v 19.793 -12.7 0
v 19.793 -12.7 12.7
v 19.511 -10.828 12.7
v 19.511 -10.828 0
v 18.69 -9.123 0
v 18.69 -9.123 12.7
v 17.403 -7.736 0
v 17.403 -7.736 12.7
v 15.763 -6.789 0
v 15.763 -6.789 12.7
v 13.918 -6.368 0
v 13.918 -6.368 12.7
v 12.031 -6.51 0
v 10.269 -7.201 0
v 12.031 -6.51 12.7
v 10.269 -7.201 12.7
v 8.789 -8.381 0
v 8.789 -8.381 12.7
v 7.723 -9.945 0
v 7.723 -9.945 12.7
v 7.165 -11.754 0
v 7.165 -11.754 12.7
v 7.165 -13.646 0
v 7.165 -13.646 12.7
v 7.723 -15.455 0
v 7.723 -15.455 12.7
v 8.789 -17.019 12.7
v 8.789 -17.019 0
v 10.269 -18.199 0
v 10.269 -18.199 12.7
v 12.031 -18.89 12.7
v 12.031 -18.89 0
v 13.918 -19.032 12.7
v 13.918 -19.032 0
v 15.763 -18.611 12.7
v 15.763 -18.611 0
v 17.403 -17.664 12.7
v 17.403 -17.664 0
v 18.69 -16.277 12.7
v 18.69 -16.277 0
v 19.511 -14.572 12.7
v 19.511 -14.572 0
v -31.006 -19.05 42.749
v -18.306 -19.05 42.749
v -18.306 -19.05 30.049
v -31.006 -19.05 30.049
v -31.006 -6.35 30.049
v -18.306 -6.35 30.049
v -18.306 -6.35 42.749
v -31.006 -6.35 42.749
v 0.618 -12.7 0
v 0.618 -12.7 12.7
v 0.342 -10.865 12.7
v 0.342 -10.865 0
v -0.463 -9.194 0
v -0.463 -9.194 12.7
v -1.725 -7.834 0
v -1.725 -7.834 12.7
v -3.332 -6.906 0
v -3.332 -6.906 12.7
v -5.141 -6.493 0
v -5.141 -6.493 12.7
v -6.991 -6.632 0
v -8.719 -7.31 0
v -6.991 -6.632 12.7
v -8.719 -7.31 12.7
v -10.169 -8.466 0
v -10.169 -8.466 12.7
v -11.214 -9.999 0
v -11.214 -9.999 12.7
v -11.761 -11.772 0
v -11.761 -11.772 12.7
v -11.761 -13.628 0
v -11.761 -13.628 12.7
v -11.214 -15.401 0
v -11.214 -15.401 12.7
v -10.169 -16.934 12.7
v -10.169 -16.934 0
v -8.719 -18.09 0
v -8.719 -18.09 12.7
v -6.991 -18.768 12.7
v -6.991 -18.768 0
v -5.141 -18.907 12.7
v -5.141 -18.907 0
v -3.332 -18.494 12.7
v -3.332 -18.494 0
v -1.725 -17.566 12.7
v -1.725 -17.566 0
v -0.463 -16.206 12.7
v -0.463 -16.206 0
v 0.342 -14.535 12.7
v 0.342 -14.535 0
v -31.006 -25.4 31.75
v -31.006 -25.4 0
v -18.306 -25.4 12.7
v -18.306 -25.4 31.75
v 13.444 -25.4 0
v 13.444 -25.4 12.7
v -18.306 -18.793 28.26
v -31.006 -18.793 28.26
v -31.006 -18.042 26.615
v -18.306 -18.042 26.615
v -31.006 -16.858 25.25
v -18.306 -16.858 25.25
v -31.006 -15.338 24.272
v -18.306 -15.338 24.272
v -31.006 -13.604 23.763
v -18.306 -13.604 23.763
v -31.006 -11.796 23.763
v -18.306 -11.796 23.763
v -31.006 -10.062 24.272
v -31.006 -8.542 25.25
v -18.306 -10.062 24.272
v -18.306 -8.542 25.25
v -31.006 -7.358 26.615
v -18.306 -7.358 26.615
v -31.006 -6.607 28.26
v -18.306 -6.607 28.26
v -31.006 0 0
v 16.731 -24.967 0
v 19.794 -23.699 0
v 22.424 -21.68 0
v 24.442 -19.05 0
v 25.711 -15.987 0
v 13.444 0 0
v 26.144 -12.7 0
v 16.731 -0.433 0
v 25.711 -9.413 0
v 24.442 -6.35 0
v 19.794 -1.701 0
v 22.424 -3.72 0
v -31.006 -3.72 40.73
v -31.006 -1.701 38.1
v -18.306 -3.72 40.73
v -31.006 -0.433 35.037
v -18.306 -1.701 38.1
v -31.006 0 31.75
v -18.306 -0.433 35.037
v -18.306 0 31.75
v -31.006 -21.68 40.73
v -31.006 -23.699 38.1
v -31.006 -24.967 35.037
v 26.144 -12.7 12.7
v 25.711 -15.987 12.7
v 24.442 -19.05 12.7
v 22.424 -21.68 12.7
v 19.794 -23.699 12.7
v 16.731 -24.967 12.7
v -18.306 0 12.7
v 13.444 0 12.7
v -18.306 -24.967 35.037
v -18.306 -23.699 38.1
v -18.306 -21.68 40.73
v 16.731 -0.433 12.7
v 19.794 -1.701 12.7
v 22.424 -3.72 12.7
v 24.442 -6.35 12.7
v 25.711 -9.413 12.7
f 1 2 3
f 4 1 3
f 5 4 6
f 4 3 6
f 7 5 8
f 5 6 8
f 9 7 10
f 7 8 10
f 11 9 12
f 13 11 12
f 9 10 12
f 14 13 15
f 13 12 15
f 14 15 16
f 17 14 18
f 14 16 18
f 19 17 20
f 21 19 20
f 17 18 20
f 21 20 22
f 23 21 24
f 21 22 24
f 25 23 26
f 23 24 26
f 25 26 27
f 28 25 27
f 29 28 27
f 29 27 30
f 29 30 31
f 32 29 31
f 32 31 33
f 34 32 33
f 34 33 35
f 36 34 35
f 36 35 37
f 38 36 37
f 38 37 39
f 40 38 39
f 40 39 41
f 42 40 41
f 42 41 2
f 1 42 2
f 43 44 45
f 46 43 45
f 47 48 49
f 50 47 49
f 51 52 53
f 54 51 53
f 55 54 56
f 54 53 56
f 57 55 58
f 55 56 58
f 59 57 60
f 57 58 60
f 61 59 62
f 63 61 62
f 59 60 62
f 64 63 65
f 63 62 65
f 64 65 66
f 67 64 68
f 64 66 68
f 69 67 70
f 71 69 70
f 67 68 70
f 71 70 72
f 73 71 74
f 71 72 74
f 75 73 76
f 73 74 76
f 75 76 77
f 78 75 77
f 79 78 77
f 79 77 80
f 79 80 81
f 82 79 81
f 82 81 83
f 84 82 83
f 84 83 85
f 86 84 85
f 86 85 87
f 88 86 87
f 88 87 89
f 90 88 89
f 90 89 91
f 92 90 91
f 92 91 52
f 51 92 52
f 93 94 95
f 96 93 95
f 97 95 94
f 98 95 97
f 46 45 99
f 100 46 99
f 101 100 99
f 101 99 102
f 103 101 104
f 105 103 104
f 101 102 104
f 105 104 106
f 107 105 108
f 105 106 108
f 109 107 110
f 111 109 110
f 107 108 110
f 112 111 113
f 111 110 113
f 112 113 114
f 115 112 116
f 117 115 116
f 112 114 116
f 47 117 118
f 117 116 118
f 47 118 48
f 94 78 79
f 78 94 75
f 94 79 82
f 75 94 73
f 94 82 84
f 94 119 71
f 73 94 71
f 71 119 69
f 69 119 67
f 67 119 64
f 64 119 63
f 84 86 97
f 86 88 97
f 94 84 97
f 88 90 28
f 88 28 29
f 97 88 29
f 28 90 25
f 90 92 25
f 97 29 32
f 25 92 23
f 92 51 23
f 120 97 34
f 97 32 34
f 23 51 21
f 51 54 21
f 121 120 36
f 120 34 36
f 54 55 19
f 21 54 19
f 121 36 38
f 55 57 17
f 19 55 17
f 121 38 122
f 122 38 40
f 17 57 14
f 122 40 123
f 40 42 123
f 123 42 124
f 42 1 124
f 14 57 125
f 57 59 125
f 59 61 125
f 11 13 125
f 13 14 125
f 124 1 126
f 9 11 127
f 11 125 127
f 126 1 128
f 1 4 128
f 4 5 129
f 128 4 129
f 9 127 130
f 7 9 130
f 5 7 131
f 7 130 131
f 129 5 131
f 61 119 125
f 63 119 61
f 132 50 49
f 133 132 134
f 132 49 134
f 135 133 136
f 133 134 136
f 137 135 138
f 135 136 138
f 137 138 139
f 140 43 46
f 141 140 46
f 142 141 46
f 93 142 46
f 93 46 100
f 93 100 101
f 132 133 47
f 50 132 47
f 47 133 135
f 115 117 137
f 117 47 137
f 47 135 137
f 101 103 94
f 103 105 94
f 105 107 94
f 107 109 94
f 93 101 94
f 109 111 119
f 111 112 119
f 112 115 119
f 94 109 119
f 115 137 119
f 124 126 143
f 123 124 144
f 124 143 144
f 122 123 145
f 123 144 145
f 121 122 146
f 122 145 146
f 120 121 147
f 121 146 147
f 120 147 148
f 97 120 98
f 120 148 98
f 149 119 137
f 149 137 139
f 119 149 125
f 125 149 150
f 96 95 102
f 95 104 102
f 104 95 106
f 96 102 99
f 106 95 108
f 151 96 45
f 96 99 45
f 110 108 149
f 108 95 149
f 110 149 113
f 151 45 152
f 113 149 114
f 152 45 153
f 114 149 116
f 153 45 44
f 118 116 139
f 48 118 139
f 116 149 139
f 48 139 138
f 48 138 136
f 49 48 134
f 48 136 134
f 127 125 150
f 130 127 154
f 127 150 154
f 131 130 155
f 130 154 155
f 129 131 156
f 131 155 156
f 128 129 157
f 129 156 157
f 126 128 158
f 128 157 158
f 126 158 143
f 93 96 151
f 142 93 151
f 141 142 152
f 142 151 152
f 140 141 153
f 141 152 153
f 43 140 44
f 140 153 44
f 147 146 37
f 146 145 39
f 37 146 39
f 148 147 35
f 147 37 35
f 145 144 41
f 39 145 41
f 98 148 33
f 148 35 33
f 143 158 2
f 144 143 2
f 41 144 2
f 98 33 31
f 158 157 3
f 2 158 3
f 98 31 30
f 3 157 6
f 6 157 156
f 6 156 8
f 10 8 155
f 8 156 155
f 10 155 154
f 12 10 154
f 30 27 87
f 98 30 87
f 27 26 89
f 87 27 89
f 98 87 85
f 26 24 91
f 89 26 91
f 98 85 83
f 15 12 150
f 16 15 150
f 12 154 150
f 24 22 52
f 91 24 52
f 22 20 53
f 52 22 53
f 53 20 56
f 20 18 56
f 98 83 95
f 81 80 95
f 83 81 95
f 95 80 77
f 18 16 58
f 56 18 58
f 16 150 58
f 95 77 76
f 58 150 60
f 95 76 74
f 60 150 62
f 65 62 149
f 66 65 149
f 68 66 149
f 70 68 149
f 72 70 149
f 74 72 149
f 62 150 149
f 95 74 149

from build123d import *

# Parameters (mm, degrees)
F1_DEPTH  = 25.4
F2_R      = 6.2243902107
F2_R_2    = 6.3495156859
F3_DEPTH  = 12.701
F6_DEPTH  = 12.701
F8_DEPTH  = 12.701
F10_DEPTH = 12.701
F11_DEPTH = 12.701
F12_DEPTH = 12.701


# Not quite as in the source:
# - a feature names something its author has since deleted; it is built from what else it names


with BuildPart() as f1:
    # F0 (on Front) → F1 (new body)
    with BuildSketch(Plane.XZ):
        Polygon((-18.3063060958, 44.45), (-31.0063060958, 44.45), (-31.0063060958, 0), (26.1436939042, 0), (26.1436939042, 12.7), (-18.3063060958, 12.7), align=None)
    extrude(amount=F1_DEPTH)

    # F2 (on face) → F3 (cut, through all)
    with BuildSketch(Plane.XY.offset(12.7)):
        with Locations((-5.6063060958, -12.7)):
            Circle(F2_R)
        with Locations((13.4436939042, -12.7)):
            Circle(F2_R_2)
    extrude(amount=-F3_DEPTH, mode=Mode.SUBTRACT)

    # F4 (on face) → F6 (cut, through all)
    with BuildSketch(Plane.XY.offset(12.7)):
        with BuildLine():
            ThreePointArc((13.4436939042, 0), (22.4239500253, -3.7197438789), (26.1436939042, -12.7))
            Line((26.1436939042, -12.7), (26.1436939042, 0))
            Line((26.1436939042, 0), (13.4436939042, 0))
        make_face()
        with BuildLine():
            ThreePointArc((26.1436939042, -12.7), (22.4239500253, -21.6802561211), (13.4436939042, -25.4))
            Line((13.4436939042, -25.4), (26.1436939042, -25.4))
            Line((26.1436939042, -25.4), (26.1436939042, -12.7))
        make_face()
    extrude(amount=-F6_DEPTH, mode=Mode.SUBTRACT)

    # F7 (on face) → F8 (cut, through all)
    with BuildSketch(Plane.YZ.offset(-18.3063060958)):
        with BuildLine():
            ThreePointArc((-12.7, 44.45), (-3.7197438789, 40.7302561211), (0, 31.75))
            Line((0, 31.75), (0, 44.45))
            Line((0, 44.45), (-12.7, 44.45))
        make_face()
        with BuildLine():
            ThreePointArc((-25.4, 31.75), (-21.6802561211, 40.7302561211), (-12.7, 44.45))
            Line((-12.7, 44.45), (-25.4, 44.45))
            Line((-25.4, 44.45), (-25.4, 31.75))
        make_face()
    extrude(amount=-F8_DEPTH, mode=Mode.SUBTRACT)

    # F9 (on face) → F10 (cut, through all)
    with BuildSketch(Plane.YZ.offset(-18.3063060958)):
        with BuildLine():
            ThreePointArc((-12.7, 44.45), (-15.9870018728, 44.0172579939), (-19.05, 42.7485226281))
            Line((-19.05, 42.7485226281), (-19.05, 30.0485226281))
            ThreePointArc((-19.05, 30.0485226281), (-12.7, 23.6985226281), (-6.35, 30.0485226281))
            Line((-6.35, 30.0485226281), (-6.35, 42.7485226281))
            ThreePointArc((-6.35, 42.7485226281), (-9.4129981272, 44.0172579939), (-12.7, 44.45))
        make_face()
    extrude(amount=-F10_DEPTH, mode=Mode.SUBTRACT)

    # F7 (on face) → F11 (cut, through all)
    with BuildSketch(Plane.YZ.offset(-18.3063060958)):
        with BuildLine():
            ThreePointArc((-12.7, 44.45), (-3.7197438789, 40.7302561211), (0, 31.75))
            Line((0, 31.75), (0, 44.45))
            Line((0, 44.45), (-12.7, 44.45))
        make_face()
    extrude(amount=-F11_DEPTH, mode=Mode.SUBTRACT)

    # F7 (on face) → F12 (cut, through all)
    with BuildSketch(Plane.YZ.offset(-18.3063060958)):
        with BuildLine():
            ThreePointArc((-25.4, 31.75), (-21.6802561211, 40.7302561211), (-12.7, 44.45))
            Line((-12.7, 44.45), (-25.4, 44.45))
            Line((-25.4, 44.45), (-25.4, 31.75))
        make_face()
        with BuildLine():
            ThreePointArc((-12.7, 44.45), (-3.7197438789, 40.7302561211), (0, 31.75))
            Line((0, 31.75), (0, 44.45))
            Line((0, 44.45), (-12.7, 44.45))
        make_face()
    extrude(amount=-F12_DEPTH, mode=Mode.SUBTRACT)


solid = f1.part
